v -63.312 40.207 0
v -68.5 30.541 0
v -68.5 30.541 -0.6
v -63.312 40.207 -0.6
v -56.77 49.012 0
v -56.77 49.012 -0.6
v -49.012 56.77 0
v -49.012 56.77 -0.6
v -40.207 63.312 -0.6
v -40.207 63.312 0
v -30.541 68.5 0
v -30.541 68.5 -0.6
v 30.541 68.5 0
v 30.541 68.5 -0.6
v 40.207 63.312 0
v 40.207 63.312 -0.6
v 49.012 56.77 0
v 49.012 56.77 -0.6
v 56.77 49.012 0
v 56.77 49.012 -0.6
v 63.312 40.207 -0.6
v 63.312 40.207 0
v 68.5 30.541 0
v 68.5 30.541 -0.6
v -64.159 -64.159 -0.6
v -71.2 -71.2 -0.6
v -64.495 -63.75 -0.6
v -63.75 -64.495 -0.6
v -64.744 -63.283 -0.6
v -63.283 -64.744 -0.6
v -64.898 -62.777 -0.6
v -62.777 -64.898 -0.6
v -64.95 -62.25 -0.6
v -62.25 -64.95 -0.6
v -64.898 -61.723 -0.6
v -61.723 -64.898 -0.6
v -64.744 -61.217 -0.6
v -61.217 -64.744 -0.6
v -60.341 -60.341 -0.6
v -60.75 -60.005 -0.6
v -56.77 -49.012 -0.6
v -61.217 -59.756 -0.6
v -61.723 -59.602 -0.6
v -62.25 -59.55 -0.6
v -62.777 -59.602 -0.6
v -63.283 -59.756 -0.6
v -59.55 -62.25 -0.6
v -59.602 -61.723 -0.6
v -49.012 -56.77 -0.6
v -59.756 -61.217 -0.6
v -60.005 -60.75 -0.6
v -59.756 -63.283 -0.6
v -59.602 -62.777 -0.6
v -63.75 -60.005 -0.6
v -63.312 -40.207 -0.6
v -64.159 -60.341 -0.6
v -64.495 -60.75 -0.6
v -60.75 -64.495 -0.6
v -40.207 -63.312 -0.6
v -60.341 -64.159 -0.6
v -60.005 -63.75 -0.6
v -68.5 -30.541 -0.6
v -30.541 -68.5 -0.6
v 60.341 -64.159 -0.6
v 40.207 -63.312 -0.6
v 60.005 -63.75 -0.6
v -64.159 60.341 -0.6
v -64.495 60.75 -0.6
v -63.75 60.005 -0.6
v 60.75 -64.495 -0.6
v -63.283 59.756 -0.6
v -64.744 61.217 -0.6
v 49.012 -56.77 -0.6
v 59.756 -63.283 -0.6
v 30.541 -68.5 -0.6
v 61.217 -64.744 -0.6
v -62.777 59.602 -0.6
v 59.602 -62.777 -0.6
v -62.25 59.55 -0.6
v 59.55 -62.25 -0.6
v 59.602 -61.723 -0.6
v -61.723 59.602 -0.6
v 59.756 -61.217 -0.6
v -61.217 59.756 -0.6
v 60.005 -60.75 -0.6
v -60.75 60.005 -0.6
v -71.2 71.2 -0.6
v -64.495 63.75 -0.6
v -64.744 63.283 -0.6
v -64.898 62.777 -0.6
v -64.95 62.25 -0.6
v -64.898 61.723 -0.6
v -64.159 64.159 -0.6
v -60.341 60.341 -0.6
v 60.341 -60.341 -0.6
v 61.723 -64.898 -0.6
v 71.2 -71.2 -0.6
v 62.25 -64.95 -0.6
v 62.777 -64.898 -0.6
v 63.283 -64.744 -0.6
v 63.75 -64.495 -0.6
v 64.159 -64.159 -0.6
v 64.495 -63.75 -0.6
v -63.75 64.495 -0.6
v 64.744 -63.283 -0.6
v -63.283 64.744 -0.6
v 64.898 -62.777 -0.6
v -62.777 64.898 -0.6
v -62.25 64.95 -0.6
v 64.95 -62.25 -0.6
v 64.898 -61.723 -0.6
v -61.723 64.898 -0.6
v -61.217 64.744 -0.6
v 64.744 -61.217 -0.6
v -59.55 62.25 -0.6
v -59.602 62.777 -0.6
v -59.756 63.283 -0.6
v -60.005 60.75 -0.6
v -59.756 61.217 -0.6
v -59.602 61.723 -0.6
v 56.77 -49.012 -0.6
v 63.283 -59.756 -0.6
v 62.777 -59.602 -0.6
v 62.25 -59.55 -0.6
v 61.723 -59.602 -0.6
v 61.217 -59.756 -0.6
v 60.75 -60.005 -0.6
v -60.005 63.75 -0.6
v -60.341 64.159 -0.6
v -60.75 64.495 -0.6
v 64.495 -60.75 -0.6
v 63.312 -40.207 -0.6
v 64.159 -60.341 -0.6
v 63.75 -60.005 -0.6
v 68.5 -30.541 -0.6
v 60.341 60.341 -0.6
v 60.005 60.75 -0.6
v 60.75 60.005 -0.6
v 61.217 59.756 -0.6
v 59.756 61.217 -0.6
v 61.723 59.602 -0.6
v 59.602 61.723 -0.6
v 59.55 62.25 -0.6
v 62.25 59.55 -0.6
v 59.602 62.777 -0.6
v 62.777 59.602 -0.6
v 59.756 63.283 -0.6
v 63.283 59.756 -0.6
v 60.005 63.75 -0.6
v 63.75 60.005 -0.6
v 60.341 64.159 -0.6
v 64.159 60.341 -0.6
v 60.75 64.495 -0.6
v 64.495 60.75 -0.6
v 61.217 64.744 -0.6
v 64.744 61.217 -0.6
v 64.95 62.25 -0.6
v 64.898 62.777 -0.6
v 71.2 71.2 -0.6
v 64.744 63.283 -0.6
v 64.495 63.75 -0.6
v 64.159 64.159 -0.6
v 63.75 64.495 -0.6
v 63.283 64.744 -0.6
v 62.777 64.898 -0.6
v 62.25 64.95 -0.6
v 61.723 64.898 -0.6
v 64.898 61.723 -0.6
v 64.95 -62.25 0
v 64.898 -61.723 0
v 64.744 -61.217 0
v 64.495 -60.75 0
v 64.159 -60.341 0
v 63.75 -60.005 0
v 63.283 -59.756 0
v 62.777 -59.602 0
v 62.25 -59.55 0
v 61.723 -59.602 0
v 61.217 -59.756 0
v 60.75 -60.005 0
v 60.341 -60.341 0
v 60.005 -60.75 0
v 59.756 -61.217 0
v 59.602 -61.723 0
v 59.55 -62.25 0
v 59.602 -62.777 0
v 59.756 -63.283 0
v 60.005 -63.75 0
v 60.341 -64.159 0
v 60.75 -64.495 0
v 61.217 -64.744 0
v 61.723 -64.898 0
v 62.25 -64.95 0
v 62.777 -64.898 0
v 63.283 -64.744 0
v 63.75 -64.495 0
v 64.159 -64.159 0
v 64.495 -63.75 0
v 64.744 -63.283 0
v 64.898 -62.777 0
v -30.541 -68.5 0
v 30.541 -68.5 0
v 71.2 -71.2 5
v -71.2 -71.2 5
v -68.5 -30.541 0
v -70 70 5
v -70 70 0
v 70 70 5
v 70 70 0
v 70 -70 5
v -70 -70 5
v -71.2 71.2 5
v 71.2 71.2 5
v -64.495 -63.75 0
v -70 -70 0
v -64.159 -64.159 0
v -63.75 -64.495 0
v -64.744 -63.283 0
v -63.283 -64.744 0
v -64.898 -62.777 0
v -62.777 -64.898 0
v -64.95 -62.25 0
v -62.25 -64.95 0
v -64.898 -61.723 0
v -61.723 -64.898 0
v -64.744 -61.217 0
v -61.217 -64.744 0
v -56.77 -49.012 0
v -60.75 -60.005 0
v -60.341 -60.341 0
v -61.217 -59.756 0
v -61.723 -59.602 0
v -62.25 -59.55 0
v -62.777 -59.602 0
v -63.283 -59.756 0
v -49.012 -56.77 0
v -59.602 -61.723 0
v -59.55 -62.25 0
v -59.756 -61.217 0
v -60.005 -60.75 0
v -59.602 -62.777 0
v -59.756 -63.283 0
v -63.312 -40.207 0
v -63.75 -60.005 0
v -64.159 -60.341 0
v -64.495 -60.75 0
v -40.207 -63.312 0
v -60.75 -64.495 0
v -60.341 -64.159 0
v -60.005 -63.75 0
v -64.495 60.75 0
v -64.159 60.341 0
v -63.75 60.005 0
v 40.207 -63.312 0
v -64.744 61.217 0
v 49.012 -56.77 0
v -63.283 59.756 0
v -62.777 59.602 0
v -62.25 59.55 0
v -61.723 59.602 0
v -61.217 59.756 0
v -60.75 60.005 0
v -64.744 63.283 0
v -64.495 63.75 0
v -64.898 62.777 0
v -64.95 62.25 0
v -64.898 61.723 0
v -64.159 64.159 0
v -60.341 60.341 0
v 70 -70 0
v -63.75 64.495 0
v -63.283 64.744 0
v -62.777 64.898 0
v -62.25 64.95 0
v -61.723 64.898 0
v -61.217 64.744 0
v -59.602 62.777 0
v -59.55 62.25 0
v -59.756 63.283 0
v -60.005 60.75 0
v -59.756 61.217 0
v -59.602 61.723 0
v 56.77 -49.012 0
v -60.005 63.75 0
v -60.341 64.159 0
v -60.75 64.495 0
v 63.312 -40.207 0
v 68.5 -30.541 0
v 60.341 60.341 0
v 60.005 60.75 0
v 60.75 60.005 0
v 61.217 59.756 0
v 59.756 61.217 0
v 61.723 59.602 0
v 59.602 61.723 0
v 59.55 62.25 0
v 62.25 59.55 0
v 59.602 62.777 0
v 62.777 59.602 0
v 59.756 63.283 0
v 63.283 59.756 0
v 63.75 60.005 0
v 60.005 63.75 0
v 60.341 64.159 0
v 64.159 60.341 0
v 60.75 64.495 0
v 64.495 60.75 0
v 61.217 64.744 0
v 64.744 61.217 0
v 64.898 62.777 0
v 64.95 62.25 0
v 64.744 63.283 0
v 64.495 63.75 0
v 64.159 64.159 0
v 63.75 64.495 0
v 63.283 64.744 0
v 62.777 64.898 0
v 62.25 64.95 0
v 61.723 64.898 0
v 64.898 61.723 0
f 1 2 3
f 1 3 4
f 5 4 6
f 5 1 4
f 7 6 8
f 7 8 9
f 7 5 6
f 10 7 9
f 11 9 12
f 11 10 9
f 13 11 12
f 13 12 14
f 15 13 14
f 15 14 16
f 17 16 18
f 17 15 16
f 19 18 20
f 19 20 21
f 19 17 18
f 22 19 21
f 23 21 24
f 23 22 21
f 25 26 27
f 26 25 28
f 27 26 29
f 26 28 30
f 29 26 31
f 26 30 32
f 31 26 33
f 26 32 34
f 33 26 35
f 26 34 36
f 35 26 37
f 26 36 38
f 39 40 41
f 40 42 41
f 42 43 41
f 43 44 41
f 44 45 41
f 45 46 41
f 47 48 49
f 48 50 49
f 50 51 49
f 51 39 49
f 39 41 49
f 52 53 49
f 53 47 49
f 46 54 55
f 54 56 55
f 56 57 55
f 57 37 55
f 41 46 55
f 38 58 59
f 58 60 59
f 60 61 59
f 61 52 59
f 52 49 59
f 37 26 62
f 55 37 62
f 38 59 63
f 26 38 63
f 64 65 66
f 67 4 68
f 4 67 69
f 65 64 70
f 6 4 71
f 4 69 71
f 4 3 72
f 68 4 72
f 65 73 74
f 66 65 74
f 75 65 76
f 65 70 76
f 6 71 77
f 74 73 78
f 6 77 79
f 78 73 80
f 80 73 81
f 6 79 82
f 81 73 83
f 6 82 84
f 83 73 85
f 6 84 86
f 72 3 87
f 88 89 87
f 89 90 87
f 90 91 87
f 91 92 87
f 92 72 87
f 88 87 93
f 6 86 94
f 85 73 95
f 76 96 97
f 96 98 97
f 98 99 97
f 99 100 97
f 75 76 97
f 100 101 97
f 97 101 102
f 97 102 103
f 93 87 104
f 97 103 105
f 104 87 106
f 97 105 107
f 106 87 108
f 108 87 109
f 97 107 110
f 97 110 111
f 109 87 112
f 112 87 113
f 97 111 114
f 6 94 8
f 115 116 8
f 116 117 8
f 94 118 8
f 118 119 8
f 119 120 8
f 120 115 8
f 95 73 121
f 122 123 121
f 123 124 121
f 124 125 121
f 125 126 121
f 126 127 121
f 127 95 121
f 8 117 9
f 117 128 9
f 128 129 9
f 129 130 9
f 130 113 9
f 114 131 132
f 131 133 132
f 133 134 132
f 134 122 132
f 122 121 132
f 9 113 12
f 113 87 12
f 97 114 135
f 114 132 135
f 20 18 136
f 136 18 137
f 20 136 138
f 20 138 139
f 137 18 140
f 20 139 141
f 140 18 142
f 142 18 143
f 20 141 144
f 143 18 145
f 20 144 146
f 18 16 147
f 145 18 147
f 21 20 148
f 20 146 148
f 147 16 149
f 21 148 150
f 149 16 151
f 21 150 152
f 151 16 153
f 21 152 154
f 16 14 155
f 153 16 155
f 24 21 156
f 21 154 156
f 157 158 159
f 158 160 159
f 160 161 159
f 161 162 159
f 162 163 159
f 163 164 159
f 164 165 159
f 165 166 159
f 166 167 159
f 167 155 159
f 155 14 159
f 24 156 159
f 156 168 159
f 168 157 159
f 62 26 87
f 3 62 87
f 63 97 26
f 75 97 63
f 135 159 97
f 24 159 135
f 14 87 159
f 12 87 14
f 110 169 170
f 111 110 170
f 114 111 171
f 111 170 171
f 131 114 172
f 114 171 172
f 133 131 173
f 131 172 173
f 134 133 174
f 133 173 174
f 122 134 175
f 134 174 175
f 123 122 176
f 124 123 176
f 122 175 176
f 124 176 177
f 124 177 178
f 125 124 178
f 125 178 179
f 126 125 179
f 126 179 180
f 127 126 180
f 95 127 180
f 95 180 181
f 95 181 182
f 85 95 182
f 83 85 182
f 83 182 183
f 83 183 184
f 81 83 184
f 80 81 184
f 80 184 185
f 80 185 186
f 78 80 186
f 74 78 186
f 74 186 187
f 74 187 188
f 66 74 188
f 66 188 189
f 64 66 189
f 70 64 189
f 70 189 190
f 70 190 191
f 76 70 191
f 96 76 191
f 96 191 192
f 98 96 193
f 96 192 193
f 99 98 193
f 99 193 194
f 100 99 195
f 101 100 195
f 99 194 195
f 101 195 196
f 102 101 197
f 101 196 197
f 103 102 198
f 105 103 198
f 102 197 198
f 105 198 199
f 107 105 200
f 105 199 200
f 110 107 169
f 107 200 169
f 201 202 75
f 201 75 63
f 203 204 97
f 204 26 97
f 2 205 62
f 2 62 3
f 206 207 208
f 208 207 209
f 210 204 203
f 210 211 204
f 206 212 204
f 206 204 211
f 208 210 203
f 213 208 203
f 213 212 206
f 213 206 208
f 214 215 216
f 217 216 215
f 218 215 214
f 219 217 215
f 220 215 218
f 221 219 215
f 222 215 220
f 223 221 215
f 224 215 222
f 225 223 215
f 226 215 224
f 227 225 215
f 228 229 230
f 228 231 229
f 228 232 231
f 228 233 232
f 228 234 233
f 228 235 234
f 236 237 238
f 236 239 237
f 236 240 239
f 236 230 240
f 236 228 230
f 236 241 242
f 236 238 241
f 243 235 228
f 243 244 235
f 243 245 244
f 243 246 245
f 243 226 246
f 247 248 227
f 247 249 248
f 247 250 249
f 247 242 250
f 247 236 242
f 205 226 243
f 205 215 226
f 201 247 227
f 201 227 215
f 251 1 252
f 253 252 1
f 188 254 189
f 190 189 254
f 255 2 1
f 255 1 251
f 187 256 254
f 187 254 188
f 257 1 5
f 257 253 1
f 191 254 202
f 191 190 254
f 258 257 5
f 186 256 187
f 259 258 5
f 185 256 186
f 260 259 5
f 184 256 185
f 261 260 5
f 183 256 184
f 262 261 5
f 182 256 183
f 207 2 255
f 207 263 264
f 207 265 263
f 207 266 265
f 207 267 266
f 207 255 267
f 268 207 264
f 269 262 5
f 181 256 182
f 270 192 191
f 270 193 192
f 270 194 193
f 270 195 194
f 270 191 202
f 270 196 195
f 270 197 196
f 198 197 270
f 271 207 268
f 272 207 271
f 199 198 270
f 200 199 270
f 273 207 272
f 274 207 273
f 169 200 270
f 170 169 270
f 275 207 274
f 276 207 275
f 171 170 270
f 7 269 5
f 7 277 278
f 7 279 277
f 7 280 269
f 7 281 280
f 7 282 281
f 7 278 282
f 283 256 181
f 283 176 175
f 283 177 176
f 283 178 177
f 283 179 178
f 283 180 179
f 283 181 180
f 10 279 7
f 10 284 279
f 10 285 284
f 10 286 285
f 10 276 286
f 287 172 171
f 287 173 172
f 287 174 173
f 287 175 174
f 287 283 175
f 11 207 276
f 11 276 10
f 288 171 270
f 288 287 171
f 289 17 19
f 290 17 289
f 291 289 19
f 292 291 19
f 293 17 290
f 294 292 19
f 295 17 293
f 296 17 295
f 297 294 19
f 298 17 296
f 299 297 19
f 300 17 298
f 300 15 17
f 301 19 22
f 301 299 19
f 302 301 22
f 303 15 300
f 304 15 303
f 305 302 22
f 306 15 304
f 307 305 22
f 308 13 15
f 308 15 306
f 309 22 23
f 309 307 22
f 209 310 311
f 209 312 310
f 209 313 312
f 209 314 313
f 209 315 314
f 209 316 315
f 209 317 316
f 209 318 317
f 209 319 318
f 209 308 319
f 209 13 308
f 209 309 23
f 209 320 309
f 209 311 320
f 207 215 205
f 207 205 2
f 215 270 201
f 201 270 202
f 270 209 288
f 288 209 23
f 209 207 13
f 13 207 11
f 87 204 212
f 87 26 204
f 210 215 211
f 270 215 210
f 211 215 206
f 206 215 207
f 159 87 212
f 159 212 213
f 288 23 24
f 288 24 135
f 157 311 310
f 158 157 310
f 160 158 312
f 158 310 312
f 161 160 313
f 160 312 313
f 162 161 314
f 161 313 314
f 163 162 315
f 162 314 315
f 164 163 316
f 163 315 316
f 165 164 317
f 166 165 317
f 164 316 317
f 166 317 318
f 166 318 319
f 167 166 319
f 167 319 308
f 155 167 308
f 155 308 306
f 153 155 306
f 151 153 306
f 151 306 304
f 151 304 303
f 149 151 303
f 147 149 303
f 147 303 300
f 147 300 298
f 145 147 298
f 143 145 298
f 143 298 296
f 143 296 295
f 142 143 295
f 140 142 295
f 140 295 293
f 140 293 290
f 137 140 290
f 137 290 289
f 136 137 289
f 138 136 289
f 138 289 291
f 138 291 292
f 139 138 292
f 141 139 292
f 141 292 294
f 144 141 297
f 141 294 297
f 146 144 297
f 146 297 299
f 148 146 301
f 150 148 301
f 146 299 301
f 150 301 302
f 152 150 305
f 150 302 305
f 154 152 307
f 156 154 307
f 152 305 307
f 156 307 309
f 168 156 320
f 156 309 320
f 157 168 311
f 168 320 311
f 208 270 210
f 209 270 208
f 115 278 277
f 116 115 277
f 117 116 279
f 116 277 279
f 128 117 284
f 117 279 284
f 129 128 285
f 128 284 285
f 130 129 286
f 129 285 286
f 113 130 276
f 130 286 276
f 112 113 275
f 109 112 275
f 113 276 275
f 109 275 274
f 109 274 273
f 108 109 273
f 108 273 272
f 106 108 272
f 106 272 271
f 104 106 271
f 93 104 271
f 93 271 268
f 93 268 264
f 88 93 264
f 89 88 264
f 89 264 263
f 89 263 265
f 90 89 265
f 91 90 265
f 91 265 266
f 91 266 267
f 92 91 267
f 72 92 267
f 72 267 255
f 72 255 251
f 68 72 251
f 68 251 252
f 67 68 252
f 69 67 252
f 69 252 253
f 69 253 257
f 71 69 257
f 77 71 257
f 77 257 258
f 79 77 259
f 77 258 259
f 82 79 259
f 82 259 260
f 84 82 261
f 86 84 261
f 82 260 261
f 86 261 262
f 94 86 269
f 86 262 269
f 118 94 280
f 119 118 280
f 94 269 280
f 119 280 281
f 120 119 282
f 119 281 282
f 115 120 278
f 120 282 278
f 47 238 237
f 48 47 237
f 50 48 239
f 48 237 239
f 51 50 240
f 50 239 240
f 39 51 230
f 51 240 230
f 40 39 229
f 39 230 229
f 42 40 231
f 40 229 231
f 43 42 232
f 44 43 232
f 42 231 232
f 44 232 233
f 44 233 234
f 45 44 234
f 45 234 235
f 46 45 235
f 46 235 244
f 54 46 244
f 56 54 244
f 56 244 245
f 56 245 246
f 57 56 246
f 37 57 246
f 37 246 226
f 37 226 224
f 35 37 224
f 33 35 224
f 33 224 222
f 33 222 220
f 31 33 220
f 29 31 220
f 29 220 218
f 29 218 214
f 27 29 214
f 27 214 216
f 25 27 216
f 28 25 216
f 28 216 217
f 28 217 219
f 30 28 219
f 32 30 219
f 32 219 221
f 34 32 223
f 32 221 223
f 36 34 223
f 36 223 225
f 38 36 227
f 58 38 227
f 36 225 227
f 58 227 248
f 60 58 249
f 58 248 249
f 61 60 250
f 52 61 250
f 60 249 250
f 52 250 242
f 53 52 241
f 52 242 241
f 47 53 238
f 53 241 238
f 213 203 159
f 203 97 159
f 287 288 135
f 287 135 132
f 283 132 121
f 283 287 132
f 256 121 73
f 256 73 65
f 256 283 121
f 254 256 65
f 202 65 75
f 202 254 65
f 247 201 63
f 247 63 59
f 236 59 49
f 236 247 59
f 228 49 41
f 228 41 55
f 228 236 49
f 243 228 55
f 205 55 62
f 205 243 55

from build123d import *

# Parameters (mm, degrees)
F1_W     = 142.4
F1_H     = 142.4
F4_DEPTH = 0.6
F2_W     = 142.4
F2_H     = 142.4
F2_W_2   = 140
F2_H_2   = 140
F5_DEPTH = 5
F3_R     = 2.7
F6_DEPTH = 0.601


with BuildPart() as f4:
    # F1 (on Top) → F4 (new body)
    with BuildSketch(Plane.XY):
        Rectangle(F1_W, F1_H)
        with BuildLine():
            ThreePointArc((-68.5, 30.540956), (-53.033009, 53.033009), (-30.540956, 68.5))
            Line((-30.540956, 68.5), (30.540956, 68.5))
            ThreePointArc((30.540956, 68.5), (53.033009, 53.033009), (68.5, 30.540956))
            Line((68.5, 30.540956), (68.5, -30.540956))
            ThreePointArc((68.5, -30.540956), (53.033009, -53.033009), (30.540956, -68.5))
            Line((30.540956, -68.5), (-30.540956, -68.5))
            ThreePointArc((-30.540956, -68.5), (-53.033009, -53.033009), (-68.5, -30.540956))
            Line((-68.5, -30.540956), (-68.5, 30.540956))
        make_face(mode=Mode.SUBTRACT)
    extrude(amount=-F4_DEPTH)

    # F2 (on Top) → F5 (join)
    with BuildSketch(Plane.XY):
        Rectangle(F2_W, F2_H)
        Rectangle(F2_W_2, F2_H_2, mode=Mode.SUBTRACT)
    extrude(amount=F5_DEPTH)

    # F3 (on Top) → F6 (cut, through all)
    with BuildSketch(Plane.XY):
        with Locations((62.25, 62.25)):
            Circle(F3_R)
        with Locations((-62.25, 62.25)):
            Circle(F3_R)
        with Locations((-62.25, -62.25)):
            Circle(F3_R)
        with Locations((62.25, -62.25)):
            Circle(F3_R)
    extrude(amount=-F6_DEPTH, mode=Mode.SUBTRACT)


solid = f4.part
